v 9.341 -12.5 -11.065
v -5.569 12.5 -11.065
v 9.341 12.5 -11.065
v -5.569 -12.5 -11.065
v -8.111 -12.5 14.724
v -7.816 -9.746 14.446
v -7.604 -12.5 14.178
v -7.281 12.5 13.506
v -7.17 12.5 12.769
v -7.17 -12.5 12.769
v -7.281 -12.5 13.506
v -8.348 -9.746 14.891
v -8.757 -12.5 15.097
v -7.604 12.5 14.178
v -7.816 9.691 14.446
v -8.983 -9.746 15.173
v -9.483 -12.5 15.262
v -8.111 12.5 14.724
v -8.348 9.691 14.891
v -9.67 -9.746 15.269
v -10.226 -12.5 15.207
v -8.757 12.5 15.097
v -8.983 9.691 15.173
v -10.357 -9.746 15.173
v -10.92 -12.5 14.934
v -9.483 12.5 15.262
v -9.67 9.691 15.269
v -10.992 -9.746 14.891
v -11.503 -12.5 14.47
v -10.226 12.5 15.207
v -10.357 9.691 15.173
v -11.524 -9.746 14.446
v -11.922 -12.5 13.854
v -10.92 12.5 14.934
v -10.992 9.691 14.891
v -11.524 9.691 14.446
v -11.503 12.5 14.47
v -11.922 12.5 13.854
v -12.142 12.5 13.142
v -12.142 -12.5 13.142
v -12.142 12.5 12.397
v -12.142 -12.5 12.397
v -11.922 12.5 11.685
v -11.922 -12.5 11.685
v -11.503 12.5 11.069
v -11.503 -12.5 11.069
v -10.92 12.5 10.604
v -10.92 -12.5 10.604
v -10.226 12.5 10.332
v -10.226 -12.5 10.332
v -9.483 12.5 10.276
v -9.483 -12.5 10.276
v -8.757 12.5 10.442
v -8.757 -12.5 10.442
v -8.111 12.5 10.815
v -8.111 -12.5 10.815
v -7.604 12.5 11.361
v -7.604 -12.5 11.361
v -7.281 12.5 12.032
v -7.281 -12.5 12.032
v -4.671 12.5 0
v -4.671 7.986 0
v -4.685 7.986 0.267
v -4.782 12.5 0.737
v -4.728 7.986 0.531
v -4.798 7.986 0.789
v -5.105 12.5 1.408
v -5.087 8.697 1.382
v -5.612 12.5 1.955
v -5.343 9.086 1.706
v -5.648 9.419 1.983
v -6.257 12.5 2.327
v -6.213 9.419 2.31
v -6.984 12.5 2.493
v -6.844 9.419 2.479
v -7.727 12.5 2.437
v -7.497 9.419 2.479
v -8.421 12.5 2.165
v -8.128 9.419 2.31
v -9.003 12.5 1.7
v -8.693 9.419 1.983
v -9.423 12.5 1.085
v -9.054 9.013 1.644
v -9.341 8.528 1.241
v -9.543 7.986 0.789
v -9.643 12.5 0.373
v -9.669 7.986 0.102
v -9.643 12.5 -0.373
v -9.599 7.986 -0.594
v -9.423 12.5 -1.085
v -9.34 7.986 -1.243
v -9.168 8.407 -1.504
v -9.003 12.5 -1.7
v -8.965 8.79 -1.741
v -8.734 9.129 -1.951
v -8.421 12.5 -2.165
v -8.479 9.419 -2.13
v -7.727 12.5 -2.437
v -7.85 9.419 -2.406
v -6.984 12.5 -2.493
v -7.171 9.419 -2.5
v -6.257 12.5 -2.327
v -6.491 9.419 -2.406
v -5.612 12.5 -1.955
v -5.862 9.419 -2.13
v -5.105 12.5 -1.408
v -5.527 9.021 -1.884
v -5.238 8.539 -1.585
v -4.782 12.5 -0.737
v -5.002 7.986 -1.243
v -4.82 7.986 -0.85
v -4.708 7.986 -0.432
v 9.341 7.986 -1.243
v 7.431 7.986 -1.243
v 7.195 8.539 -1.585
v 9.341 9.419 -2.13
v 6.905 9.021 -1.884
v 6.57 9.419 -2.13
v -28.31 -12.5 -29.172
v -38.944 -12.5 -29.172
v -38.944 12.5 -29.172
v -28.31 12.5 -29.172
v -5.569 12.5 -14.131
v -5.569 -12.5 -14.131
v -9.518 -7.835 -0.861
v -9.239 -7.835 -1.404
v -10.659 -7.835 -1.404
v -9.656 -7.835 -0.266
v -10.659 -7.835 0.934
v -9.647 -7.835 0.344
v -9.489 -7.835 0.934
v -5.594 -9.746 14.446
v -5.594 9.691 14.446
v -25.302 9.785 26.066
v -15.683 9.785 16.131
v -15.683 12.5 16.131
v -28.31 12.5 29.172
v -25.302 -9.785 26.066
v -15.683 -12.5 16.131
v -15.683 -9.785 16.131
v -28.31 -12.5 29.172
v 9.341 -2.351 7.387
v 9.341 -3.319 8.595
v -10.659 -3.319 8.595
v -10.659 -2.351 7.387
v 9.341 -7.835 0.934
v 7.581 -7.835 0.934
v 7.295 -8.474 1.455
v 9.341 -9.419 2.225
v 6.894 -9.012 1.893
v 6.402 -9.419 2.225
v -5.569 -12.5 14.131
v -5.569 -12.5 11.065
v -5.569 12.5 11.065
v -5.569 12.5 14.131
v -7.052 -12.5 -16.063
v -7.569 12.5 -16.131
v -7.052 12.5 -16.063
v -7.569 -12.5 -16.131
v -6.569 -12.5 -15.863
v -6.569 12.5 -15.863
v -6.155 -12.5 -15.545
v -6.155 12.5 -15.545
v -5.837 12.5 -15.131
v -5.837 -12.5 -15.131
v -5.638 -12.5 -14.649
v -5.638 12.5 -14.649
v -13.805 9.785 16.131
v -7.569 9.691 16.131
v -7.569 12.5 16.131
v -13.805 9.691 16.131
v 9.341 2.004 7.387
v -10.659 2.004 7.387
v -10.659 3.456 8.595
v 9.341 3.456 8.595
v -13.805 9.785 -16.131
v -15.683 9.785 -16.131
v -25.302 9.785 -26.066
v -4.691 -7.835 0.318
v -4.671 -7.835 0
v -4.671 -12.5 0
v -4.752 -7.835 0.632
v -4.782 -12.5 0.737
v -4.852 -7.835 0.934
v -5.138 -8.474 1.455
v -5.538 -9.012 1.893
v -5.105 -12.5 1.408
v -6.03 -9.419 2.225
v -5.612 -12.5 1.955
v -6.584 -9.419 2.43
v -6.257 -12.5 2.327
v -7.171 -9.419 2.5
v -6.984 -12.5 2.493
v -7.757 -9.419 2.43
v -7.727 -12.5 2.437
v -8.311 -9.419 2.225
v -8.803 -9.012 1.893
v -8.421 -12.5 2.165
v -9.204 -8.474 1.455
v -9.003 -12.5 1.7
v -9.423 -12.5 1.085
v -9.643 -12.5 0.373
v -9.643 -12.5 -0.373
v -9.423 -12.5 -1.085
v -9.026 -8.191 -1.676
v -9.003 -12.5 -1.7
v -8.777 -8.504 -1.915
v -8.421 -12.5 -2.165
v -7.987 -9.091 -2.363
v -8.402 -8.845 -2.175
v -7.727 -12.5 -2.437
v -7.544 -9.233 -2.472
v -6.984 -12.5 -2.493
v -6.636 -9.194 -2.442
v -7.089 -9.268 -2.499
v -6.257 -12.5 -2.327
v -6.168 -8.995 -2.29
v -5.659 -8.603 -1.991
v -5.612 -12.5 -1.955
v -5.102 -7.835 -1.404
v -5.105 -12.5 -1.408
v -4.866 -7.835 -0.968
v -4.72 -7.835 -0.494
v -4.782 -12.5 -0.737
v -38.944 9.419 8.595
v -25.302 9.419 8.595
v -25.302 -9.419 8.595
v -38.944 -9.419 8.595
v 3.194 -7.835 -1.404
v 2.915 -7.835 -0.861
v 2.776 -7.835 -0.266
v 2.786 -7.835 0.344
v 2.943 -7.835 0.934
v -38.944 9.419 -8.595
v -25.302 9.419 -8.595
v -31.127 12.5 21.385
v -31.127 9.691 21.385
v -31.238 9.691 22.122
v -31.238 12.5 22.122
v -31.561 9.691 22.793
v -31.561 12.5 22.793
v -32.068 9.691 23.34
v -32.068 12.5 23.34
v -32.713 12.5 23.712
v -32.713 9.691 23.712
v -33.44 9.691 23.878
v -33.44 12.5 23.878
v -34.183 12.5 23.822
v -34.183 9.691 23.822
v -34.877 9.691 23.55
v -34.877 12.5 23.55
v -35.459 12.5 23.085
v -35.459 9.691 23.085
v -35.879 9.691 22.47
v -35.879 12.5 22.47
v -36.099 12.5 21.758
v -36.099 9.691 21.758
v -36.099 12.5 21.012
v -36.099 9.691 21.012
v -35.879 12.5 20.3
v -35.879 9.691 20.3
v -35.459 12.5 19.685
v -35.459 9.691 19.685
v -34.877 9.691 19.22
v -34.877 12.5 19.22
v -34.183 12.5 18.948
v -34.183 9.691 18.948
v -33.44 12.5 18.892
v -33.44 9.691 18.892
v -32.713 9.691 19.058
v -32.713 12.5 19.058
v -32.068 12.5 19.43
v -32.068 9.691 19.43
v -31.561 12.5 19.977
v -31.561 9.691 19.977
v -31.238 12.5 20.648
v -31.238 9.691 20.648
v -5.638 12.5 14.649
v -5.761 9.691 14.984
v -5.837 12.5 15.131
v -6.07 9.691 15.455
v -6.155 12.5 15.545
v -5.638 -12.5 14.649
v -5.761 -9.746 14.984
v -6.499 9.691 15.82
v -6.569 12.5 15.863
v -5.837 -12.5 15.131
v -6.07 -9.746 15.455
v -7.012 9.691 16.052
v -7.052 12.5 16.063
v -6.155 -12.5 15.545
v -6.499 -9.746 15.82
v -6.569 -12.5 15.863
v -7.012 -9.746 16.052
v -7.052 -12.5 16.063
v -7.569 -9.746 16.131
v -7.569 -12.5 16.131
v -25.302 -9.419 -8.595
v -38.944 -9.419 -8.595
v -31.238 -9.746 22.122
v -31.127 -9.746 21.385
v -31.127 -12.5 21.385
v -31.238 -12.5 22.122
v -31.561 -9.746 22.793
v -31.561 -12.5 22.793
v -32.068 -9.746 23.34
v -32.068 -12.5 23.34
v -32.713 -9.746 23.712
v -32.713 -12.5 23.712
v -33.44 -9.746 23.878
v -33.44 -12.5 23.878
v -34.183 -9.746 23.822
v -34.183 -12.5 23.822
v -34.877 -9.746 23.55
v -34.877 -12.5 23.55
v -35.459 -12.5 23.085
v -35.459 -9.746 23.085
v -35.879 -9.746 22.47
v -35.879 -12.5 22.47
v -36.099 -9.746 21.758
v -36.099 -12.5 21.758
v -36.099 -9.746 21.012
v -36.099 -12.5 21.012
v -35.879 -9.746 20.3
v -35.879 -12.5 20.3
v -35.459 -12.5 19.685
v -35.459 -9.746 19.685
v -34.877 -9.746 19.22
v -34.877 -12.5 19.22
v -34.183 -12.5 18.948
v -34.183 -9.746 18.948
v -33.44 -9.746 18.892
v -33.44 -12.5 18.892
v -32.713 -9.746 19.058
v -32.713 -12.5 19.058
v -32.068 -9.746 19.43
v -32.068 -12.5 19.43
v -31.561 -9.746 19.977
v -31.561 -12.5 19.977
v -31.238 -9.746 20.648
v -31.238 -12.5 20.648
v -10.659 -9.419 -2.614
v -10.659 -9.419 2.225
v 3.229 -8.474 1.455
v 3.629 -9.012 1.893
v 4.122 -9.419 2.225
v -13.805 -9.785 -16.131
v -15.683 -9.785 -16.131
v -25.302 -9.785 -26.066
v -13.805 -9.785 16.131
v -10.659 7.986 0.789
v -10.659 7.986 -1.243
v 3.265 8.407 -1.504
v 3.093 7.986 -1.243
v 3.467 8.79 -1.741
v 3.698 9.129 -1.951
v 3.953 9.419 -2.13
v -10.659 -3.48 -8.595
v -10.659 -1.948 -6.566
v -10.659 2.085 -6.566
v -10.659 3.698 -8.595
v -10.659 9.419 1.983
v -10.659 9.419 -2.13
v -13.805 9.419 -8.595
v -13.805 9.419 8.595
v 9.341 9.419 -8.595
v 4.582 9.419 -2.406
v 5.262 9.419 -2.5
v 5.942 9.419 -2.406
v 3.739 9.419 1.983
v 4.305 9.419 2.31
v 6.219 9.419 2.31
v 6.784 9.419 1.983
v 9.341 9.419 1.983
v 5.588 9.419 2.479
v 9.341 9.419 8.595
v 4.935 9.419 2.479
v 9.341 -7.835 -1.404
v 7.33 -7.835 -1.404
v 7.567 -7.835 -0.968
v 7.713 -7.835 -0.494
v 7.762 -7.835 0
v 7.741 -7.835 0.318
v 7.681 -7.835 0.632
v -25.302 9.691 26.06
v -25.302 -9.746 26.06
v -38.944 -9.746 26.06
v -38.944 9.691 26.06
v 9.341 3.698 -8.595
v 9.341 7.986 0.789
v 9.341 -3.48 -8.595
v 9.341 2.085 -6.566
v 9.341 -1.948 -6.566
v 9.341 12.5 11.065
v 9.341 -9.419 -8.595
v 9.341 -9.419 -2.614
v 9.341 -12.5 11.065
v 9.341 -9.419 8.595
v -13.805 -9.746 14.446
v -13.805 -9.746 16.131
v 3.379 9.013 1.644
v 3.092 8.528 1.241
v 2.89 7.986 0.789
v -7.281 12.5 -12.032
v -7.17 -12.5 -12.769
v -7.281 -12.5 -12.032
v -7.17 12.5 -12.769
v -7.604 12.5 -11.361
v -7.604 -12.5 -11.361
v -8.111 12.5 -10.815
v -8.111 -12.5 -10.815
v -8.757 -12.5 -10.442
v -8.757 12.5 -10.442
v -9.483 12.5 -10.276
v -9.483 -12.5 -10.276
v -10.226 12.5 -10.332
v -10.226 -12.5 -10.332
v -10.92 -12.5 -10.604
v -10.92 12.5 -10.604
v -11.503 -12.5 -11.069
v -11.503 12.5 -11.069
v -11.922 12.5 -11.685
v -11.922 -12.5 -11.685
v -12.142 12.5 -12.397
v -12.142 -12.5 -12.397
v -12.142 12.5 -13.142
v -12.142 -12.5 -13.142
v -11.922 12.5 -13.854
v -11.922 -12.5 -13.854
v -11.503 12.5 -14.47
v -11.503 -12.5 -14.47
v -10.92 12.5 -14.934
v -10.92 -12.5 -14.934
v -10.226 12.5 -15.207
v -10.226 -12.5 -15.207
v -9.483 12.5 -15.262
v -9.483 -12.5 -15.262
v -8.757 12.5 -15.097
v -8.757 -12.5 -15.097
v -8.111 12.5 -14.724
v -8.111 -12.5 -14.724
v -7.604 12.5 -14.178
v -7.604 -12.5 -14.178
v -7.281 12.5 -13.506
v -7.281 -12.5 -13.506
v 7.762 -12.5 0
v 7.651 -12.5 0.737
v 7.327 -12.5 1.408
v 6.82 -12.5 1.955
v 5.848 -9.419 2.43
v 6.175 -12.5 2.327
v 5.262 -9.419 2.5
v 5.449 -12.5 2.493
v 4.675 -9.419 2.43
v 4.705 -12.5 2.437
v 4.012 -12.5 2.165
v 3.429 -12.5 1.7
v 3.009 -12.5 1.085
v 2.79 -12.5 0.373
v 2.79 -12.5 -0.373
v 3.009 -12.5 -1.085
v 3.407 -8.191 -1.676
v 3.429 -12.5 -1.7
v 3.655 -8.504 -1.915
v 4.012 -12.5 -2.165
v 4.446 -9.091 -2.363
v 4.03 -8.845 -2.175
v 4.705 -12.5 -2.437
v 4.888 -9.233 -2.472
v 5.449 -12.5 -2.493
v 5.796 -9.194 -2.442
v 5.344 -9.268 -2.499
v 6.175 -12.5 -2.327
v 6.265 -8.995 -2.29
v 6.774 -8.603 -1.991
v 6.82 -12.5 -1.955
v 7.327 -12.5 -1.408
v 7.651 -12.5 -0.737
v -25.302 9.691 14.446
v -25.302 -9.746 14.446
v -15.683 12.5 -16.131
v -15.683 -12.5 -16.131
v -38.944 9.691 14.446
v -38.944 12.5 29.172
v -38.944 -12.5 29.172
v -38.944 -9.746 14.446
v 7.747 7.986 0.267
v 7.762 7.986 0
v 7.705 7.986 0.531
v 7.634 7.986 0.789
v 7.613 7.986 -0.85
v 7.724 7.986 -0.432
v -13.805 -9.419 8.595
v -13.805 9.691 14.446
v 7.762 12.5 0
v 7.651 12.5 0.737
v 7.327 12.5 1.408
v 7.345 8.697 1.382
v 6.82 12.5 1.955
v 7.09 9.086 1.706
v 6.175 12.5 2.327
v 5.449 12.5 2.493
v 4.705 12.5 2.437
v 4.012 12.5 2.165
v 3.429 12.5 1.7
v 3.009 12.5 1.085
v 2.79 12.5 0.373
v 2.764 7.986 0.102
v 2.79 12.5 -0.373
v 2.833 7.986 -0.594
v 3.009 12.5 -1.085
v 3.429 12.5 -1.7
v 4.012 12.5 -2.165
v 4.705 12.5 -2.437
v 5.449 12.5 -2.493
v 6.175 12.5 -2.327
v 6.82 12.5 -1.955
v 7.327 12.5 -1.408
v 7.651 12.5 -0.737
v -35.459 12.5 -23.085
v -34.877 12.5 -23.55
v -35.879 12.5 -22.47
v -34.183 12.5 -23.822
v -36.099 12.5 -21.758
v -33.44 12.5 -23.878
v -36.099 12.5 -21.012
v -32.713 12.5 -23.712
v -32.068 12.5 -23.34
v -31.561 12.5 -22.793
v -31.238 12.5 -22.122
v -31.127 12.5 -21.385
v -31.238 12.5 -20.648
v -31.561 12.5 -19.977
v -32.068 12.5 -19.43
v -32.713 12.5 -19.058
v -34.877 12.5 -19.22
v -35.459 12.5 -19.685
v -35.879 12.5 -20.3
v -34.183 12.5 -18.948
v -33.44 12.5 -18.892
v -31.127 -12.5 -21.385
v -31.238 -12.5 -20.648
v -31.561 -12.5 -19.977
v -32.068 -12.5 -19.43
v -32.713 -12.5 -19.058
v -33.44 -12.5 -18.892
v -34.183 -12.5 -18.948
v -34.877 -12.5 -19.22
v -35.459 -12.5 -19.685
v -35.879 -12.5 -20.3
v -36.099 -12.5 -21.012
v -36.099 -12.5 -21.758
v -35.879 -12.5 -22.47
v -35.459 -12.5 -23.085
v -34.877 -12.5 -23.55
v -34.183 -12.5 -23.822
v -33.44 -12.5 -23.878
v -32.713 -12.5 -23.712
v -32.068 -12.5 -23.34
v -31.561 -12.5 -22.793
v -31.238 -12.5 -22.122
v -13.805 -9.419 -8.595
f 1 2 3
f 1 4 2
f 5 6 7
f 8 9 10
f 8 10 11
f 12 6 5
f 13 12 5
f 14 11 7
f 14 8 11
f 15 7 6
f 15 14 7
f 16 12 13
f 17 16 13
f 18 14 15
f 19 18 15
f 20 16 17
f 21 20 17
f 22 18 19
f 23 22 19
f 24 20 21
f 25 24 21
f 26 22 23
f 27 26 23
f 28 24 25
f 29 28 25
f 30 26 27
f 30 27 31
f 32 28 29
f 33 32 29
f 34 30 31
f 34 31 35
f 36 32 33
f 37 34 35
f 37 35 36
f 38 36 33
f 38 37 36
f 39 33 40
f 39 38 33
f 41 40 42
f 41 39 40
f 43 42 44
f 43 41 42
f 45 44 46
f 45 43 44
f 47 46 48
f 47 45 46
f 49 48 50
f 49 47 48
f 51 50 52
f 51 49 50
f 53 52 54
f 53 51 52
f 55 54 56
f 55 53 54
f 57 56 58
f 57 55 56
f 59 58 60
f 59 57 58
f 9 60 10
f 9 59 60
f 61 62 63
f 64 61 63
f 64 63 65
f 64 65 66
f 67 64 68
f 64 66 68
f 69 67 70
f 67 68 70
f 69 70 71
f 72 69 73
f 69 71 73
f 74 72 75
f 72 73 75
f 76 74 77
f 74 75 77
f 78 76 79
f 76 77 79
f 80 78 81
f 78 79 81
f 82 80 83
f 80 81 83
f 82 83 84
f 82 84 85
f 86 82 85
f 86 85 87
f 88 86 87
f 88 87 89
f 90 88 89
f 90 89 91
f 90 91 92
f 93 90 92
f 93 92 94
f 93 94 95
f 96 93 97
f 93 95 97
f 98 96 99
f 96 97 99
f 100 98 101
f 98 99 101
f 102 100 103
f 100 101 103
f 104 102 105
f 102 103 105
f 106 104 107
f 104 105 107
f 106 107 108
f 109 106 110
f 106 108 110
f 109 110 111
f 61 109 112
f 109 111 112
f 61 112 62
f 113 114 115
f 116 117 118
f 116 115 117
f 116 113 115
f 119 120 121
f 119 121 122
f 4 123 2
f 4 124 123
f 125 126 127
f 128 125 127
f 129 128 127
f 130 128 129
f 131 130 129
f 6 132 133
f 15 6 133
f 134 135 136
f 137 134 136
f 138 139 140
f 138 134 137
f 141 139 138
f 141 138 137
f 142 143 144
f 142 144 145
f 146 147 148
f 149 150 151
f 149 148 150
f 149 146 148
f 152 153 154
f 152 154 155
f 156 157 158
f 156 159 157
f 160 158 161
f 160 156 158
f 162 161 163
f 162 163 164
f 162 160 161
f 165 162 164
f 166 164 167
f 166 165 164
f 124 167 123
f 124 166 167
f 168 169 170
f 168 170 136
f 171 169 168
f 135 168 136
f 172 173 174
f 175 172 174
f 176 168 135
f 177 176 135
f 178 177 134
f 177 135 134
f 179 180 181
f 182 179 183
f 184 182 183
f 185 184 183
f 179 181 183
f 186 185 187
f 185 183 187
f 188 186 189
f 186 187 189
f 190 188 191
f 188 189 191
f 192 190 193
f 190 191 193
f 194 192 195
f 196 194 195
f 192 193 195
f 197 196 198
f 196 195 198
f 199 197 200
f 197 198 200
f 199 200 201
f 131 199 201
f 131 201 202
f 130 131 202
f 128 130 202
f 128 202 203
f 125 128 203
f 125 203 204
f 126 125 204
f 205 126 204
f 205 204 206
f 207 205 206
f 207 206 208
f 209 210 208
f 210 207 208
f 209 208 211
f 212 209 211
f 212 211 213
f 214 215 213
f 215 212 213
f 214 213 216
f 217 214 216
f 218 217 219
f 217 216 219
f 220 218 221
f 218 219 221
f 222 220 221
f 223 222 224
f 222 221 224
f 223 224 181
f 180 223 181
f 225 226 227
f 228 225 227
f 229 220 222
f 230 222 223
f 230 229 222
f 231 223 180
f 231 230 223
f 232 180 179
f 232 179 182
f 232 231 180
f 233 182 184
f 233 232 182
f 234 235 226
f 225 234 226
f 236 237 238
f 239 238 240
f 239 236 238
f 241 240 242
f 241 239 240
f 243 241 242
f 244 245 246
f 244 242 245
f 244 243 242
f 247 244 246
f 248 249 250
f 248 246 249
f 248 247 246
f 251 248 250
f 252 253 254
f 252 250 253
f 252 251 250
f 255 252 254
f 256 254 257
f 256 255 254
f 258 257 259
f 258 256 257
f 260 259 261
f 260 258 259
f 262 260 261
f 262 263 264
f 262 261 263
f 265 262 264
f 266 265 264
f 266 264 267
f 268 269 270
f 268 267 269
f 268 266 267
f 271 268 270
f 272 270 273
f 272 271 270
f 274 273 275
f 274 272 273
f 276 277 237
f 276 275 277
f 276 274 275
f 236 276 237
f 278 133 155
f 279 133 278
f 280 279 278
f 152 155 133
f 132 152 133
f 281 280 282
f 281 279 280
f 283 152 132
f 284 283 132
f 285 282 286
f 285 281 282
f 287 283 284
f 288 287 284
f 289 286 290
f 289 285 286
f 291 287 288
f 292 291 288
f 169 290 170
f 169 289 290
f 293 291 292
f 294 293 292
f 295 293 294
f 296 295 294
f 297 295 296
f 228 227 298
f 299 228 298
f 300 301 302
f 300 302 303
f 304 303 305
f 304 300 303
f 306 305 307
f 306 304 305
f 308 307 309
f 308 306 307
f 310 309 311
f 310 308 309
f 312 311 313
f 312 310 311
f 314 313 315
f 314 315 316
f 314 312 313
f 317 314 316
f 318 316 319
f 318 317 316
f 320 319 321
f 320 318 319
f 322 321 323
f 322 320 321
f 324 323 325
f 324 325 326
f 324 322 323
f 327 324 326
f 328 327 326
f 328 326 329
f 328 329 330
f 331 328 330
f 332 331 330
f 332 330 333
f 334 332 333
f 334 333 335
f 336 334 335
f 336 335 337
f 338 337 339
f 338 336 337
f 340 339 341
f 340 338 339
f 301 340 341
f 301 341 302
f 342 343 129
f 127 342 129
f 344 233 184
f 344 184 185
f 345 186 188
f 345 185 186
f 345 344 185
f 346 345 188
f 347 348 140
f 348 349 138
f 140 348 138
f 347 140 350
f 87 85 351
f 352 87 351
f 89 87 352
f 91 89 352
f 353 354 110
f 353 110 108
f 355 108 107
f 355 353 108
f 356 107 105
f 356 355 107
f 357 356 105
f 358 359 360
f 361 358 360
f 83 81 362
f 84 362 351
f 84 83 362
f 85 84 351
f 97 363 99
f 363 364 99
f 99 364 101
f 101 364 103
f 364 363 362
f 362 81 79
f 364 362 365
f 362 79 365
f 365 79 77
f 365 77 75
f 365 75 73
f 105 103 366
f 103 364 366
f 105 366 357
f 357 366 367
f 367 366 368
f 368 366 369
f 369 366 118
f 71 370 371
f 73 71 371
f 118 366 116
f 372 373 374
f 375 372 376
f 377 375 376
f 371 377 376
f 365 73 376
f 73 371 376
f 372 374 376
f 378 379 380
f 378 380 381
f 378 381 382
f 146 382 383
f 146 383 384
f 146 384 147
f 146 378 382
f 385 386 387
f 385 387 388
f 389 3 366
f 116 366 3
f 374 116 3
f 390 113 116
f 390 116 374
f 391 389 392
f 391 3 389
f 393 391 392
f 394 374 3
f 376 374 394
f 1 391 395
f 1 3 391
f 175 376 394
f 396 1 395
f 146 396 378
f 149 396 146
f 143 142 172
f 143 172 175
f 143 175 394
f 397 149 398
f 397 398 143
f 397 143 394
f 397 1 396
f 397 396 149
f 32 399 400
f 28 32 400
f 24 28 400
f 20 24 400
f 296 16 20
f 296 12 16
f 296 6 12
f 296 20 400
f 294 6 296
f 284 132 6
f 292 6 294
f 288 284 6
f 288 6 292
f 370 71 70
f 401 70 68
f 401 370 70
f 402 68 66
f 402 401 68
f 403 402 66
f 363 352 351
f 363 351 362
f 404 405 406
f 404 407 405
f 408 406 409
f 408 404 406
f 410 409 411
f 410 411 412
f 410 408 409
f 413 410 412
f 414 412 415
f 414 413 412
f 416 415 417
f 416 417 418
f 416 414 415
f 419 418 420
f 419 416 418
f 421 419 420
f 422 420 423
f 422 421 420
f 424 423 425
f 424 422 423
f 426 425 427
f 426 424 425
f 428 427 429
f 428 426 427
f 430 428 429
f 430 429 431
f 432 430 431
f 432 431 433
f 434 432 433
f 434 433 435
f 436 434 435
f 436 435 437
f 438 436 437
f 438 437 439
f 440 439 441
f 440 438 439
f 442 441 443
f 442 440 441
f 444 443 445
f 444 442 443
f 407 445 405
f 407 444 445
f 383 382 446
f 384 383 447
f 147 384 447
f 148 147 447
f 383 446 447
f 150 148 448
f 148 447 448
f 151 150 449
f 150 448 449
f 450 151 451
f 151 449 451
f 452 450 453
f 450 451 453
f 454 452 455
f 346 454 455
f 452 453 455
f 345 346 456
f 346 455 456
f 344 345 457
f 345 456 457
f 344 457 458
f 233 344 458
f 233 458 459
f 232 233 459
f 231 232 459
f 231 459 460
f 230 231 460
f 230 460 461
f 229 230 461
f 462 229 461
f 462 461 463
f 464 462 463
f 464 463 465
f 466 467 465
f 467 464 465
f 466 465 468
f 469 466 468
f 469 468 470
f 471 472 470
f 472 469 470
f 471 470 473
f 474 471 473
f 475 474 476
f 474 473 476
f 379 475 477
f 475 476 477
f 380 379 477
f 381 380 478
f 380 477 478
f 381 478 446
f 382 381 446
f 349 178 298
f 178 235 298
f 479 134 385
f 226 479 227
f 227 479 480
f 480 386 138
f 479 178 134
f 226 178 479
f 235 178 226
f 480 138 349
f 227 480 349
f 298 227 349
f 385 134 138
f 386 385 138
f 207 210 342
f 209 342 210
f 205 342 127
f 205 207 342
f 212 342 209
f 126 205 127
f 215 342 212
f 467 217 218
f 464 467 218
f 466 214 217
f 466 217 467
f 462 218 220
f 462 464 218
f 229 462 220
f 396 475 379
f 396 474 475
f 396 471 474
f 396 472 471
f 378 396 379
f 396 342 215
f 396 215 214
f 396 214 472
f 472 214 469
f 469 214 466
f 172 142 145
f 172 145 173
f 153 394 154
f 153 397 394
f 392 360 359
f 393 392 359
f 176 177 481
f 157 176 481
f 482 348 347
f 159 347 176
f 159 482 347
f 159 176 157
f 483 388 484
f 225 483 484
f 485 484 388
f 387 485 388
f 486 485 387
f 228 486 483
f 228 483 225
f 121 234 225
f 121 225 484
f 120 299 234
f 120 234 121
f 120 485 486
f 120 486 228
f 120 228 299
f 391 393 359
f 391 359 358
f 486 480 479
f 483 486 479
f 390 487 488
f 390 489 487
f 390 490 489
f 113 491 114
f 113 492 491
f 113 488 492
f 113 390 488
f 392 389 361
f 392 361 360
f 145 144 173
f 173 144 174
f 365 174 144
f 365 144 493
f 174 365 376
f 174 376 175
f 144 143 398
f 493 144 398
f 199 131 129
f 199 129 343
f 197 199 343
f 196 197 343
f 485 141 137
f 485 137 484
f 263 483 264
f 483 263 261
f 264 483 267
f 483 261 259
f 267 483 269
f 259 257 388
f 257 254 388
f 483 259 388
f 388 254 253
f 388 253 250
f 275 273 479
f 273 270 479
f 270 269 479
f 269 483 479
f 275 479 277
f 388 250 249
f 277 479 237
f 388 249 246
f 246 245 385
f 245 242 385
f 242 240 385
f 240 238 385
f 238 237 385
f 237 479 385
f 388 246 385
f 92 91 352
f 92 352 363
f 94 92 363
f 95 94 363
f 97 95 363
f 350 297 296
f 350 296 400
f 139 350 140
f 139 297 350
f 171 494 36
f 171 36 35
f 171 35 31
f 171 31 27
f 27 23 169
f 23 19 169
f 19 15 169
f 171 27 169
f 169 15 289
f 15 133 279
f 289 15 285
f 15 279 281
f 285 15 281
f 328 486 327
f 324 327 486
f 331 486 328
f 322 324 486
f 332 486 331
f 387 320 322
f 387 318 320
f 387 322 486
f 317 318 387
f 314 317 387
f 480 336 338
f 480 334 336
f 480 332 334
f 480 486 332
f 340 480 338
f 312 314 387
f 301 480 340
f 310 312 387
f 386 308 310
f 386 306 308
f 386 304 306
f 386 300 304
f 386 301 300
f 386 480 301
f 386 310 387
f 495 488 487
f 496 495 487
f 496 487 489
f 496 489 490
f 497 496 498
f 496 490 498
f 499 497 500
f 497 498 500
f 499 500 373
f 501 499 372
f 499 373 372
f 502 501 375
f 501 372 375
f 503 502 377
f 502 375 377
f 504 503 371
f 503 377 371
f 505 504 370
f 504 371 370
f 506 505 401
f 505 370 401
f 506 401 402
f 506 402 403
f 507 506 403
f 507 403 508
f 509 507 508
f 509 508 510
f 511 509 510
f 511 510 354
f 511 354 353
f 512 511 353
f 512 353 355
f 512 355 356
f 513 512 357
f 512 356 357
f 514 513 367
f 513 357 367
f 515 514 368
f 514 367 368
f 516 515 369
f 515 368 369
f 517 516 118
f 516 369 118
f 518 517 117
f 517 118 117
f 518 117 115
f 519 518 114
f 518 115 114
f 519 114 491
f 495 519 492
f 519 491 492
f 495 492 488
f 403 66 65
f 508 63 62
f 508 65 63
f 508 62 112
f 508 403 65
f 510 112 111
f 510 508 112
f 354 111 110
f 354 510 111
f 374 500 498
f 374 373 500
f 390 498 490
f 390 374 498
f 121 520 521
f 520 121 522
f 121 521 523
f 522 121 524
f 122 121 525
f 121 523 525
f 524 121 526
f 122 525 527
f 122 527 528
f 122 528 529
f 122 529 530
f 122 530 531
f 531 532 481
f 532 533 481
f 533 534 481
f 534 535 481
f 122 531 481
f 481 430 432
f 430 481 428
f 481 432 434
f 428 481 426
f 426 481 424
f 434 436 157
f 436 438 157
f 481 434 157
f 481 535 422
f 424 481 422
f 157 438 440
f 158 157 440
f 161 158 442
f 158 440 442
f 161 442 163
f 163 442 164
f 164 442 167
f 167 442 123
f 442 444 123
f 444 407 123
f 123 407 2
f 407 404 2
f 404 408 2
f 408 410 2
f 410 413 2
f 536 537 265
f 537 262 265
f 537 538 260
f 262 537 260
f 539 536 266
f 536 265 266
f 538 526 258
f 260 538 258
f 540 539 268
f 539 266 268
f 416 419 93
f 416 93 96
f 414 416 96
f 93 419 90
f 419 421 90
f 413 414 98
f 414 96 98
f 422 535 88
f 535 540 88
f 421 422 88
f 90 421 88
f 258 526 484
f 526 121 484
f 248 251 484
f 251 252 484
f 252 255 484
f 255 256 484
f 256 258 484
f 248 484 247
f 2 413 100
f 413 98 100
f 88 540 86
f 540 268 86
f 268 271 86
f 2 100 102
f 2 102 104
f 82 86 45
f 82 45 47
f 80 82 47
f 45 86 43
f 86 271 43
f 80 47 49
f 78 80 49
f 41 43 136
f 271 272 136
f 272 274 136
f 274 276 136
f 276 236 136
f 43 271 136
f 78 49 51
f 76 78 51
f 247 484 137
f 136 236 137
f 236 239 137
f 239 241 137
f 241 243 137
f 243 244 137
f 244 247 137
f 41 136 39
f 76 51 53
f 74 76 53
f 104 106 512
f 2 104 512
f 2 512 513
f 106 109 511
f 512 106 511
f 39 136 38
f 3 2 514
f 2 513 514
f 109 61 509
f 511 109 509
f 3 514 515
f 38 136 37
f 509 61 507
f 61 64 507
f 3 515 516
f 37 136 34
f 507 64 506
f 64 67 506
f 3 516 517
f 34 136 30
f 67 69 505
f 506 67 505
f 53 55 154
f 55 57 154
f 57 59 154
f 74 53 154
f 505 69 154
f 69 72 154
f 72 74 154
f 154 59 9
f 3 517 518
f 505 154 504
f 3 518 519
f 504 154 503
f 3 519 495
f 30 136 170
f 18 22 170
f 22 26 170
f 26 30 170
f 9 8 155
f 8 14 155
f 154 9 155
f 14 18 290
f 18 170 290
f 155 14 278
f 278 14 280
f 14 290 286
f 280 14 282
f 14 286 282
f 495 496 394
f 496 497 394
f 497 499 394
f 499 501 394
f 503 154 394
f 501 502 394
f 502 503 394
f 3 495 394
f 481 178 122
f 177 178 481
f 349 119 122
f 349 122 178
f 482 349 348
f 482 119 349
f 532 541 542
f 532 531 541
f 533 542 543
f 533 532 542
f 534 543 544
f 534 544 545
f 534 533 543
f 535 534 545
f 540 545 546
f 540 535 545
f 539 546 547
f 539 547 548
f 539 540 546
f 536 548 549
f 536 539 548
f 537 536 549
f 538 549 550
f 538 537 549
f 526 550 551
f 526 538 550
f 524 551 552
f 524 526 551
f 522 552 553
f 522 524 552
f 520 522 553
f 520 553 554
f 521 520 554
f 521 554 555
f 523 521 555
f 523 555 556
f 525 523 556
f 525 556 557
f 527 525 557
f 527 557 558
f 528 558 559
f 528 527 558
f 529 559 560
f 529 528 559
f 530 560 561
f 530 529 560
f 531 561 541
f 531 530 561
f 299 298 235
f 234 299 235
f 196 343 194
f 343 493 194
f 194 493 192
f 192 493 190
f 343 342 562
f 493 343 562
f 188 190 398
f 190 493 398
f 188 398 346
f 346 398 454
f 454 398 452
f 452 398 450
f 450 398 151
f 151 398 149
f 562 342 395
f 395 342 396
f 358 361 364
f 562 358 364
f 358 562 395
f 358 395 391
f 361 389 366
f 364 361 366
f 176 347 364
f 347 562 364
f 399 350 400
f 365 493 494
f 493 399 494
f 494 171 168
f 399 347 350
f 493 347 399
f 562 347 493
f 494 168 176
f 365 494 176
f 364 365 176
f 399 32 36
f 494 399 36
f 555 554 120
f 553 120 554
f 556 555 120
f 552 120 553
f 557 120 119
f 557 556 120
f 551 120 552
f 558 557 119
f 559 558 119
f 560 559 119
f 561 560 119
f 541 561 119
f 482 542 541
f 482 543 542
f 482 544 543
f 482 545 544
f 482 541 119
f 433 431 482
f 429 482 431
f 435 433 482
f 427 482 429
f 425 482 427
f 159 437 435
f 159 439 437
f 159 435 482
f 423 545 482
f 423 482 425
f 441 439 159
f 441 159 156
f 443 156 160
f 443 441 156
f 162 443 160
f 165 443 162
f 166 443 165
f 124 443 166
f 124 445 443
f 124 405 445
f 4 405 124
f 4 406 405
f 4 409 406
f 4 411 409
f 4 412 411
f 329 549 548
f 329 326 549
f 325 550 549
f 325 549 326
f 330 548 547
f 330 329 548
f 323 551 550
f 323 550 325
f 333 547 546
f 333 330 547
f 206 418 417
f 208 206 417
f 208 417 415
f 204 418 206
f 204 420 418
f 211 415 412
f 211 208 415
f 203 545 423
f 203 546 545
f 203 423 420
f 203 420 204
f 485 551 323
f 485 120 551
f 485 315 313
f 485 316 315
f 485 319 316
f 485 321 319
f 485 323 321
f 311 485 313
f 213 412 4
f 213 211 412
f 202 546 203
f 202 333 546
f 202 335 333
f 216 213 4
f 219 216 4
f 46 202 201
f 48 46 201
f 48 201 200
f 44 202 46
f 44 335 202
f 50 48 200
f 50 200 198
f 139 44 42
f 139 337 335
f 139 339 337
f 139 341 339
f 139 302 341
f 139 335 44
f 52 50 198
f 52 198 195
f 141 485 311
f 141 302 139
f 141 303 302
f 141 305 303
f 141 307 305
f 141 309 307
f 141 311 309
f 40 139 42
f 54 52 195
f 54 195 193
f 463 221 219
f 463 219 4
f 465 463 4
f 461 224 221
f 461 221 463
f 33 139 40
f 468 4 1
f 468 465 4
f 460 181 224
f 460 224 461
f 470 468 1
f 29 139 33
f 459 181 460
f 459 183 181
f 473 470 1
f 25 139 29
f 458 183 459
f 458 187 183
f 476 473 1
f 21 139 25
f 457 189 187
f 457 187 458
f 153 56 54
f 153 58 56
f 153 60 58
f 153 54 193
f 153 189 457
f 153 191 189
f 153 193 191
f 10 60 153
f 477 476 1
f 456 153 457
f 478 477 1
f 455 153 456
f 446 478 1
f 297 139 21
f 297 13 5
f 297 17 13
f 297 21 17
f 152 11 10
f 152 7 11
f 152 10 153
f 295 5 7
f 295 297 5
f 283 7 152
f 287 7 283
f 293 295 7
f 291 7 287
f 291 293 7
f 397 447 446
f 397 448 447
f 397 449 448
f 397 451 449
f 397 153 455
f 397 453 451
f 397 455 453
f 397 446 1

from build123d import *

# Parameters (mm, degrees)
F0_R      = 2.5
F1_DEPTH  = 12.5
F3_DEPTH  = 48.2856712694
F5_DEPTH  = 20
F7_DEPTH  = 50
F8_W      = 19.4369778037
F8_H      = 11.6137964651
F9_DEPTH  = 38.9448867569
F10_R     = 2.5
F11_DEPTH = 25.001


with BuildPart() as f1:
    # F0 (on Front) → F1 (new body, symmetric)
    with BuildSketch(Plane.XZ):
        with BuildLine():
            Line((9.3407845125, 0), (9.3407845125, 11.0652372241))
            Line((9.3407845125, 11.0652372241), (-5.5694617331, 11.0652372241))
            Line((-5.5694617331, 11.0652372241), (-5.5694617331, 14.1311359399))
            ThreePointArc((-5.5694617331, 14.1311359399), (-6.1552481707, 15.5453495022), (-7.5694617331, 16.1311359399))
            Line((-7.5694617331, 16.1311359399), (-15.6829056582, 16.1311359399))
            Line((-15.6829056582, 16.1311359399), (-28.3097643405, 29.1719902307))
            Line((-28.3097643405, 29.1719902307), (-38.9438867569, 29.1719902307))
            Line((-38.9438867569, 29.1719902307), (-38.9438867569, 0))
            Line((-38.9438867569, 0), (-38.9438867569, -29.1719902307))
            Line((-38.9438867569, -29.1719902307), (-28.3097643405, -29.1719902307))
            Line((-28.3097643405, -29.1719902307), (-15.6829056582, -16.1311359399))
            Line((-15.6829056582, -16.1311359399), (-7.5694617331, -16.1311359399))
            ThreePointArc((-7.5694617331, -16.1311359399), (-6.1552481707, -15.5453495022), (-5.5694617331, -14.1311359399))
            Line((-5.5694617331, -14.1311359399), (-5.5694617331, -11.0652372241))
            Line((-5.5694617331, -11.0652372241), (9.3407845125, -11.0652372241))
            Line((9.3407845125, -11.0652372241), (9.3407845125, 0))
        make_face()
        with Locations((-33.6268255487, -21.3849581778)):
            Circle(F0_R, mode=Mode.SUBTRACT)
        with Locations((-9.6699748597, -12.7693467682)):
            Circle(F0_R, mode=Mode.SUBTRACT)
        with Locations((-33.6268255487, 21.3849581778)):
            Circle(F0_R, mode=Mode.SUBTRACT)
        with Locations((-9.6699748597, 12.7693467682)):
            Circle(F0_R, mode=Mode.SUBTRACT)
    extrude(amount=F1_DEPTH, both=True)

    # F2 (on face) → F3 (cut, through all)
    with BuildSketch(Plane.YZ.offset(9.3407845125)):
        Polygon((9.4194319099, 8.595071733), (0, 8.595071733), (-9.4194319099, 8.595071733), (-9.4194319099, 0), (-9.4194319099, -8.595071733), (0, -8.595071733), (9.4194319099, -8.595071733), (9.4194319099, 0), align=None)
    extrude(amount=-F3_DEPTH, mode=Mode.SUBTRACT)

    # F4 (on face) → F5 (join)
    with BuildSketch(Plane.YZ.offset(9.3407845125)):
        Polygon((3.4560158383, 8.595071733), (-3.3186981454, 8.595071733), (-2.3508819286, 7.3865675367), (2.0042911638, 7.3865675367), align=None)
        Polygon((9.4194319099, -2.1302928217), (9.4194319099, 1.9829263911), (7.9856240889, 0.7893372769), (7.9856240889, -1.2431278592), align=None)
        Polygon((-1.9476253074, -6.5661179833), (-3.4800015856, -8.595071733), (3.6979699507, -8.595071733), (2.0849425346, -6.5661179833), align=None)
        Polygon((-7.8351749107, 0.9344584541), (-9.4194319099, 2.2248802707), (-9.4194319099, -2.6142010465), (-7.8351749107, -1.4044306008), align=None)
    extrude(amount=-F5_DEPTH)

    # F6 (on Top) → F7 (cut, symmetric)
    with BuildSketch(Plane.XY):
        Polygon((-13.8051696122, 9.7849667072), (-25.3022368997, 9.7849667072), (-25.3022368997, 0), (-25.3022368997, -9.7849667072), (-13.8051696122, -9.7849667072), (-13.8051696122, 0), align=None)
    extrude(amount=F7_DEPTH, both=True, mode=Mode.SUBTRACT)

    # F8 (on Right) → F9 (cut, through all)
    with BuildSketch(Plane.YZ):
        with Locations((-0.0271862373, 20.2530925162)):
            Rectangle(F8_W, F8_H)
    extrude(amount=-F9_DEPTH, mode=Mode.SUBTRACT)

    # F10 (on face) → F11 (cut, through all)
    with BuildSketch(Plane.XZ.offset(12.5)):
        with Locations((-7.1705817245, 0)):
            Circle(F10_R)
        with Locations((5.2617667243, 0)):
            Circle(F10_R)
    extrude(amount=-F11_DEPTH, mode=Mode.SUBTRACT)


solid = f1.part
